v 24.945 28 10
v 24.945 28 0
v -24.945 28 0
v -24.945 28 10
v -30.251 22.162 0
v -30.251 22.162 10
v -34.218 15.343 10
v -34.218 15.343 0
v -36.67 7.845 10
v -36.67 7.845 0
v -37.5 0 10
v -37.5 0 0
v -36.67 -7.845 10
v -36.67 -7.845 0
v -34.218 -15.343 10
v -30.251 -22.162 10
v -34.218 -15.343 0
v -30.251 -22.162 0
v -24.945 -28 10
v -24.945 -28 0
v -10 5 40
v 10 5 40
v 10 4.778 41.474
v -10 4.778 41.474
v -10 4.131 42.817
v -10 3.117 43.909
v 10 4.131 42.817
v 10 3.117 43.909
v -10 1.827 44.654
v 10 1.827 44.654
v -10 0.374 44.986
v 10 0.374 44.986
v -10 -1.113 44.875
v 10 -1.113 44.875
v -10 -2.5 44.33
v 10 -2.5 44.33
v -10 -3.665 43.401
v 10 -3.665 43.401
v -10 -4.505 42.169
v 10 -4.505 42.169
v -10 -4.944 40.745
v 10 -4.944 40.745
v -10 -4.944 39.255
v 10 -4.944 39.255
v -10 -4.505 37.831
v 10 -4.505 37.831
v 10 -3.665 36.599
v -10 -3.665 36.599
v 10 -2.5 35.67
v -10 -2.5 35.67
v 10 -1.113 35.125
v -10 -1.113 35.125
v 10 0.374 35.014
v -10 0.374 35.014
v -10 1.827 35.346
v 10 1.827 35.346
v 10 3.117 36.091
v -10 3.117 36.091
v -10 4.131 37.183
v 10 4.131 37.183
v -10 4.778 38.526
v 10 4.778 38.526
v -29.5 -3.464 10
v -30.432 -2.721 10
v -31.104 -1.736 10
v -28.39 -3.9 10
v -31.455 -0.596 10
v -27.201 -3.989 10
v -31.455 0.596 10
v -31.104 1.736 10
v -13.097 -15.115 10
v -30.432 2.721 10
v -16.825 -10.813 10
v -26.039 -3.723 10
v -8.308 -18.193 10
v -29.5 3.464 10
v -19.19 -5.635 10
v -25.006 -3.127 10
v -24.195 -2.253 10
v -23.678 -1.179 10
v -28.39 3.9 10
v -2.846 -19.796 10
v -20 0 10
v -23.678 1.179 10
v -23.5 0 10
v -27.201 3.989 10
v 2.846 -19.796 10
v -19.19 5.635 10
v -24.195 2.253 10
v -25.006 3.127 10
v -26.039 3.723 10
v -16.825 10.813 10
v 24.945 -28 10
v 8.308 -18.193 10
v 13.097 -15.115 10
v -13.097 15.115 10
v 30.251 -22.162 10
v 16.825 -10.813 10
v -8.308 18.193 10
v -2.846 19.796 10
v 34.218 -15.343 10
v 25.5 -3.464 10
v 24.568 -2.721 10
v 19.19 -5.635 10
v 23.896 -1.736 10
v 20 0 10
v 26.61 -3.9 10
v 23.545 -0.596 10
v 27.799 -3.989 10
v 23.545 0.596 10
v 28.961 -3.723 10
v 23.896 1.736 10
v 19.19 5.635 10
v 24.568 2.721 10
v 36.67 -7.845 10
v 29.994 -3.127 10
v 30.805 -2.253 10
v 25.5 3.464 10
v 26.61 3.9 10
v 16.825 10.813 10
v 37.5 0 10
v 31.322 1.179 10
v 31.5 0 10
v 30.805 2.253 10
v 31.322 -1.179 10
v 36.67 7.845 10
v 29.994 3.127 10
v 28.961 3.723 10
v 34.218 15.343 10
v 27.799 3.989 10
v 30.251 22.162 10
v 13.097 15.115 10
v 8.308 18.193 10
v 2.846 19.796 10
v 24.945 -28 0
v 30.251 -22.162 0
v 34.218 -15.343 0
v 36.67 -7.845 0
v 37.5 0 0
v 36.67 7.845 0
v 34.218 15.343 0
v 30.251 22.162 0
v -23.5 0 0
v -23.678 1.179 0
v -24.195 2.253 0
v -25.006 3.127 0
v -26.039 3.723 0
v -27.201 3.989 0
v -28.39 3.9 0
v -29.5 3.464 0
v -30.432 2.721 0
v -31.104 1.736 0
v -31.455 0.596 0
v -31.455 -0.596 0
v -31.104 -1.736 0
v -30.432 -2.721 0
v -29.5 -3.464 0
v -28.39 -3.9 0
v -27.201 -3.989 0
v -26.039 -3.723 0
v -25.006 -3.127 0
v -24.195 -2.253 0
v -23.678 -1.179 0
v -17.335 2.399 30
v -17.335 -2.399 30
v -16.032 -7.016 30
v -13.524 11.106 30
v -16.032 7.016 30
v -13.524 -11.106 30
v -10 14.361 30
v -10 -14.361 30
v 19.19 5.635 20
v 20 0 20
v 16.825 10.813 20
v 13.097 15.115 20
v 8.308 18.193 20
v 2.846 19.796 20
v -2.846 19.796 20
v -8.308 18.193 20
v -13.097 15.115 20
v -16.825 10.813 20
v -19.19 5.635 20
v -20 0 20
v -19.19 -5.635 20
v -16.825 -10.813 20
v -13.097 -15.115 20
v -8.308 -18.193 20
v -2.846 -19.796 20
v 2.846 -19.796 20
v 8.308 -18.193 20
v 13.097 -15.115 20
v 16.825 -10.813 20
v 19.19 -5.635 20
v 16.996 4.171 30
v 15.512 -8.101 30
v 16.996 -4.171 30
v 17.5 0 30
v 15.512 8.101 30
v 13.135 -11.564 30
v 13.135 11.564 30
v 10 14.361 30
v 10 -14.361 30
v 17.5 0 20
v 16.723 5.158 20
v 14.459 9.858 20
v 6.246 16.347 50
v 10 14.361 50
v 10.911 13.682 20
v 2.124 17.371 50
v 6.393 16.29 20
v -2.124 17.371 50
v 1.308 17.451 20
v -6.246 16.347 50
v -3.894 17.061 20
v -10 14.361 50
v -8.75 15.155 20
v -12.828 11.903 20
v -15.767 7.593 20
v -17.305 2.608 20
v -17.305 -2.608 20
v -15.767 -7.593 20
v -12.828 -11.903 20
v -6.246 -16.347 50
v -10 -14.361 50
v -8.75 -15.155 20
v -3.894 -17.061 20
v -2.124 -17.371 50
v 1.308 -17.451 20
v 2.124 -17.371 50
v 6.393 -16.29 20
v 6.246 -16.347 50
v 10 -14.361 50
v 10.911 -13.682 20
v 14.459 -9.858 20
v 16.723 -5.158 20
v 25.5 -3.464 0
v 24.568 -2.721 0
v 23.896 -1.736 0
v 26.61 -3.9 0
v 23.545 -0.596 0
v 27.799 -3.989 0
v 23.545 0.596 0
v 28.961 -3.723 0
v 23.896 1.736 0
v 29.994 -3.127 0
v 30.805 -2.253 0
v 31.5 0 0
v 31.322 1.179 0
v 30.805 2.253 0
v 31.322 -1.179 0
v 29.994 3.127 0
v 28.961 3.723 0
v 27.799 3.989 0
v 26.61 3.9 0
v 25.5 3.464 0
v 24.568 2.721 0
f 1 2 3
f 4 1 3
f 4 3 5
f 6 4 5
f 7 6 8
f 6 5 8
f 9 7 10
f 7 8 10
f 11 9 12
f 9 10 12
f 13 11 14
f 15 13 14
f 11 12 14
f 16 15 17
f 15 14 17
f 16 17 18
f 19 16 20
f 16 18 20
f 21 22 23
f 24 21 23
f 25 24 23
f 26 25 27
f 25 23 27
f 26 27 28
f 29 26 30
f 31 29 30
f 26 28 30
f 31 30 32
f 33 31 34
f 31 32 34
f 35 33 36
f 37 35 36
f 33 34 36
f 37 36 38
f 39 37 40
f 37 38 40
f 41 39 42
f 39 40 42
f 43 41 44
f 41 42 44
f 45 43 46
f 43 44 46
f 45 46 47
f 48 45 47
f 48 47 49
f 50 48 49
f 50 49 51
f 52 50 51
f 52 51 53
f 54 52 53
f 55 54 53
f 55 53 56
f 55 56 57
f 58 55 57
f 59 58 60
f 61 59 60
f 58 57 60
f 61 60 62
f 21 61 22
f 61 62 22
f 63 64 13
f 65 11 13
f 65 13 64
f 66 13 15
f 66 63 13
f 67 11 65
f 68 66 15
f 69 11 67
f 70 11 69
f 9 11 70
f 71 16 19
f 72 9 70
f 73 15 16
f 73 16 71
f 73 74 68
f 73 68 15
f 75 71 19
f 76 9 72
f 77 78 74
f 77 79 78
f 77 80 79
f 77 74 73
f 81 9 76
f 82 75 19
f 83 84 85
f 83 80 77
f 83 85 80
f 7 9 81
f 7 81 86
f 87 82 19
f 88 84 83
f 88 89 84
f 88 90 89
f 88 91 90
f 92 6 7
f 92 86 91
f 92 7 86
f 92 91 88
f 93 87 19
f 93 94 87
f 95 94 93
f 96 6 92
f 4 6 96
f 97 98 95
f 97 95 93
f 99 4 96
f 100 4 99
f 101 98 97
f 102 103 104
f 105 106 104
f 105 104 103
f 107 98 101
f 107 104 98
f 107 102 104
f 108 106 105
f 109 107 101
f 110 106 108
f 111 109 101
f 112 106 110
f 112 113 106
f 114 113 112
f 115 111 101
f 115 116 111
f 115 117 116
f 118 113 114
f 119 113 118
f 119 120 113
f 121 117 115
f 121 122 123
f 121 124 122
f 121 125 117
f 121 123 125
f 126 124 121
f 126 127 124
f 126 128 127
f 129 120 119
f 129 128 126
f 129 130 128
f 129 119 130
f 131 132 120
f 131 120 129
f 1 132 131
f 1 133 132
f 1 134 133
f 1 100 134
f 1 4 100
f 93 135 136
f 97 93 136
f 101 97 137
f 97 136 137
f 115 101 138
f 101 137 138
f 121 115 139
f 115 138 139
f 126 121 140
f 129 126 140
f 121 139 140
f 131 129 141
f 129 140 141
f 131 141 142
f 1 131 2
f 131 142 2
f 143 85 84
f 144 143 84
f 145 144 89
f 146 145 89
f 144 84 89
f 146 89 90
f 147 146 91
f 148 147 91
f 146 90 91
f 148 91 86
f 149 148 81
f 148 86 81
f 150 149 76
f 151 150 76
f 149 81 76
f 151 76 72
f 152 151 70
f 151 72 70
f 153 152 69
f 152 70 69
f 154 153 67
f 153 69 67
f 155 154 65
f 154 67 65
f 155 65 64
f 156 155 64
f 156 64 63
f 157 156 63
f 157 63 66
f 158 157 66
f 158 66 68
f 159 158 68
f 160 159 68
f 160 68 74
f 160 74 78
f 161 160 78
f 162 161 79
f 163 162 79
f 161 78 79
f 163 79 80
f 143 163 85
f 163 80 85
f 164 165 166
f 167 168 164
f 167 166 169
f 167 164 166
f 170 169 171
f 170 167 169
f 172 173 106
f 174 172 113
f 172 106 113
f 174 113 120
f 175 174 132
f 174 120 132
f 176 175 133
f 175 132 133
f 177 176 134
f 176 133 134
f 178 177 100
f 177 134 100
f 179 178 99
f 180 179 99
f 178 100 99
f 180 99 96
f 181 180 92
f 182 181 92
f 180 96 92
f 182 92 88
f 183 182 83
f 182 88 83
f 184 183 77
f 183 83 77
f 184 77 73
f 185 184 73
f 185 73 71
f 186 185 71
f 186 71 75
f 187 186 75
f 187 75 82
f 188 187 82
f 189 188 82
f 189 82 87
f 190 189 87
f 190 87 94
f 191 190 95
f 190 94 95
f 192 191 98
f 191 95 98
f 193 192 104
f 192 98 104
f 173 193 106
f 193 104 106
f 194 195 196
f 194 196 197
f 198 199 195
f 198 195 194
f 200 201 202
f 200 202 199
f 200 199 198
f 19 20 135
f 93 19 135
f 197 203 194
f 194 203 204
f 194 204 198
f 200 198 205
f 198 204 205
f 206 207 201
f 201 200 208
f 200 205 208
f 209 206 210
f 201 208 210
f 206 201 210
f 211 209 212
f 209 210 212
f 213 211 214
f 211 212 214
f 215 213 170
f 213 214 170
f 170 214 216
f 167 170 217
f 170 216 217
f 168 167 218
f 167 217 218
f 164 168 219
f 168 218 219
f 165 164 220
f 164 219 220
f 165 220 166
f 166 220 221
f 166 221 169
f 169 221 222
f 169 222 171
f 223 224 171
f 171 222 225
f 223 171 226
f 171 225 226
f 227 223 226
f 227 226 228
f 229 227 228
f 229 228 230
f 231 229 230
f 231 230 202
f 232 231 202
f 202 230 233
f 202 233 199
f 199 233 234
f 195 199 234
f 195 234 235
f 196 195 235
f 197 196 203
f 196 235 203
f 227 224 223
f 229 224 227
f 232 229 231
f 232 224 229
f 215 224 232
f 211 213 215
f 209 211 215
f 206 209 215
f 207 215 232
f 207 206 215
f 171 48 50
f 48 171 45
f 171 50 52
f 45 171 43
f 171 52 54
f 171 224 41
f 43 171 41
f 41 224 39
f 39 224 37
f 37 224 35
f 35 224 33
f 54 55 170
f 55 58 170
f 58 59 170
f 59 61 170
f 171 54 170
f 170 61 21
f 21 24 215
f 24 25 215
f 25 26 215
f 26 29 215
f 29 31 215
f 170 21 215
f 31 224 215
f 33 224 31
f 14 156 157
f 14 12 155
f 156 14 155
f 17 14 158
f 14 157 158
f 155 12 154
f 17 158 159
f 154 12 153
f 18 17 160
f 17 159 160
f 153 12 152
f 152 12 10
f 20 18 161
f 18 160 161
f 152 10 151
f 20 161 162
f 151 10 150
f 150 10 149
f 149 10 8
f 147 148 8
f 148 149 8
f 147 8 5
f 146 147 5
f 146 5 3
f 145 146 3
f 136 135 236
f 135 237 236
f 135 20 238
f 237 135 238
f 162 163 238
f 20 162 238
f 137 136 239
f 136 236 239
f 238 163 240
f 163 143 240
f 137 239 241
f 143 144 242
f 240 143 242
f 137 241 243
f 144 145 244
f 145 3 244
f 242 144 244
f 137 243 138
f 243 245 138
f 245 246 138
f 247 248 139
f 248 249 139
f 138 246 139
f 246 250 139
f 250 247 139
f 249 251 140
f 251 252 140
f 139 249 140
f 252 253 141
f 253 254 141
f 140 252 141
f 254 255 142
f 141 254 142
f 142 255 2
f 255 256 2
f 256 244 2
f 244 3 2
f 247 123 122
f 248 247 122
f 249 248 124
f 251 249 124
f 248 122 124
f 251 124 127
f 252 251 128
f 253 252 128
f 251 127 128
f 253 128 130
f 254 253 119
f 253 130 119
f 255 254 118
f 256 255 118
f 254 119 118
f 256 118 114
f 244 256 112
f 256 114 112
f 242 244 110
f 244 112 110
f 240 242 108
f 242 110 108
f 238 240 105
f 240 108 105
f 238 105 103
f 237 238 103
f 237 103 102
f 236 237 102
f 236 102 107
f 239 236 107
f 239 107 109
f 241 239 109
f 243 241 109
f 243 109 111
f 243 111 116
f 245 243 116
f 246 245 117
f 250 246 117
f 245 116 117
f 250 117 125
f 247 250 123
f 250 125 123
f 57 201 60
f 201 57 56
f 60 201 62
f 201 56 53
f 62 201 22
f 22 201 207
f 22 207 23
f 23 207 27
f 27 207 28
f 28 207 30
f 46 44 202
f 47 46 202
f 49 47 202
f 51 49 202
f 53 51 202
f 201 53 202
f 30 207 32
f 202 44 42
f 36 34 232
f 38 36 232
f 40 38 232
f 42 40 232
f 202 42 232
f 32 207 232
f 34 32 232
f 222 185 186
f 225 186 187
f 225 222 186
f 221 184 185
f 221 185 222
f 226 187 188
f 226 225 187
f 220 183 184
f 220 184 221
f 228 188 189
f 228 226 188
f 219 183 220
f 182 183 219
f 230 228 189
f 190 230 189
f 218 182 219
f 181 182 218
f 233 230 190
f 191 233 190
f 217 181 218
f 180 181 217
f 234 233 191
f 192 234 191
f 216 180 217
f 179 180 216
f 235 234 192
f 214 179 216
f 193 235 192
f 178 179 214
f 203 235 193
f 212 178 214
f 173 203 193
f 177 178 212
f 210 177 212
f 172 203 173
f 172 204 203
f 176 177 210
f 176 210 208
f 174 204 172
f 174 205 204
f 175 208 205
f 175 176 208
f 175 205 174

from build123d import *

# Parameters (mm, degrees)
F1_DEPTH  = 10
F2_R      = 4
F3_DEPTH  = 10
F4_R      = 20
F5_DEPTH  = 10
F6_R      = 17.5
F7_DEPTH  = 30
F9_DEPTH  = 20
F10_R     = 5
F11_DEPTH = 20


with BuildPart() as f1:
    # F0 (on Top) → F1 (new body)
    with BuildSketch(Plane.XY):
        with BuildLine():
            Line((24.944939, 28), (-24.944939, 28))
            ThreePointArc((-24.944939, 28), (-37.5, 0), (-24.944939, -28))
            Line((-24.944939, -28), (24.944939, -28))
            ThreePointArc((24.944939, -28), (37.5, 0), (24.944939, 28))
        make_face()
    extrude(amount=F1_DEPTH)

    # F2 (on face) → F3 (cut, through all)
    with BuildSketch(Plane.XY.offset(10)):
        with Locations((-27.5, 0)):
            Circle(F2_R)
        with Locations((27.5, 0)):
            Circle(F2_R)
    extrude(amount=-F3_DEPTH, mode=Mode.SUBTRACT)

    # F4 (on face) → F5 (join)
    with BuildSketch(Plane.XY.offset(10)):
        Circle(F4_R)
    extrude(amount=F5_DEPTH)

    # F6 (on face) → F7 (join)
    with BuildSketch(Plane.XY.offset(20)):
        Circle(F6_R)
    extrude(amount=F7_DEPTH)

    # F8 (on face) → F9 (cut)
    with BuildSketch(Plane.XY.offset(50)):
        with BuildLine():
            Line((-10, -14.361407), (-10, 14.361407))
            ThreePointArc((-10, 14.361407), (-17.5, 0), (-10, -14.361407))
        make_face()
        with BuildLine():
            ThreePointArc((17.5, 0), (15.512092, 8.100926), (10, 14.361407))
            Line((10, 14.361407), (10, -14.361407))
            ThreePointArc((10, -14.361407), (15.512092, -8.100926), (17.5, 0))
        make_face()
    extrude(amount=-F9_DEPTH, mode=Mode.SUBTRACT)

    # F10 (on face) → F11 (cut, through all)
    with BuildSketch(Plane.YZ.offset(10)):
        with Locations((0, 40)):
            Circle(F10_R)
    extrude(amount=-F11_DEPTH, mode=Mode.SUBTRACT)


solid = f1.part
